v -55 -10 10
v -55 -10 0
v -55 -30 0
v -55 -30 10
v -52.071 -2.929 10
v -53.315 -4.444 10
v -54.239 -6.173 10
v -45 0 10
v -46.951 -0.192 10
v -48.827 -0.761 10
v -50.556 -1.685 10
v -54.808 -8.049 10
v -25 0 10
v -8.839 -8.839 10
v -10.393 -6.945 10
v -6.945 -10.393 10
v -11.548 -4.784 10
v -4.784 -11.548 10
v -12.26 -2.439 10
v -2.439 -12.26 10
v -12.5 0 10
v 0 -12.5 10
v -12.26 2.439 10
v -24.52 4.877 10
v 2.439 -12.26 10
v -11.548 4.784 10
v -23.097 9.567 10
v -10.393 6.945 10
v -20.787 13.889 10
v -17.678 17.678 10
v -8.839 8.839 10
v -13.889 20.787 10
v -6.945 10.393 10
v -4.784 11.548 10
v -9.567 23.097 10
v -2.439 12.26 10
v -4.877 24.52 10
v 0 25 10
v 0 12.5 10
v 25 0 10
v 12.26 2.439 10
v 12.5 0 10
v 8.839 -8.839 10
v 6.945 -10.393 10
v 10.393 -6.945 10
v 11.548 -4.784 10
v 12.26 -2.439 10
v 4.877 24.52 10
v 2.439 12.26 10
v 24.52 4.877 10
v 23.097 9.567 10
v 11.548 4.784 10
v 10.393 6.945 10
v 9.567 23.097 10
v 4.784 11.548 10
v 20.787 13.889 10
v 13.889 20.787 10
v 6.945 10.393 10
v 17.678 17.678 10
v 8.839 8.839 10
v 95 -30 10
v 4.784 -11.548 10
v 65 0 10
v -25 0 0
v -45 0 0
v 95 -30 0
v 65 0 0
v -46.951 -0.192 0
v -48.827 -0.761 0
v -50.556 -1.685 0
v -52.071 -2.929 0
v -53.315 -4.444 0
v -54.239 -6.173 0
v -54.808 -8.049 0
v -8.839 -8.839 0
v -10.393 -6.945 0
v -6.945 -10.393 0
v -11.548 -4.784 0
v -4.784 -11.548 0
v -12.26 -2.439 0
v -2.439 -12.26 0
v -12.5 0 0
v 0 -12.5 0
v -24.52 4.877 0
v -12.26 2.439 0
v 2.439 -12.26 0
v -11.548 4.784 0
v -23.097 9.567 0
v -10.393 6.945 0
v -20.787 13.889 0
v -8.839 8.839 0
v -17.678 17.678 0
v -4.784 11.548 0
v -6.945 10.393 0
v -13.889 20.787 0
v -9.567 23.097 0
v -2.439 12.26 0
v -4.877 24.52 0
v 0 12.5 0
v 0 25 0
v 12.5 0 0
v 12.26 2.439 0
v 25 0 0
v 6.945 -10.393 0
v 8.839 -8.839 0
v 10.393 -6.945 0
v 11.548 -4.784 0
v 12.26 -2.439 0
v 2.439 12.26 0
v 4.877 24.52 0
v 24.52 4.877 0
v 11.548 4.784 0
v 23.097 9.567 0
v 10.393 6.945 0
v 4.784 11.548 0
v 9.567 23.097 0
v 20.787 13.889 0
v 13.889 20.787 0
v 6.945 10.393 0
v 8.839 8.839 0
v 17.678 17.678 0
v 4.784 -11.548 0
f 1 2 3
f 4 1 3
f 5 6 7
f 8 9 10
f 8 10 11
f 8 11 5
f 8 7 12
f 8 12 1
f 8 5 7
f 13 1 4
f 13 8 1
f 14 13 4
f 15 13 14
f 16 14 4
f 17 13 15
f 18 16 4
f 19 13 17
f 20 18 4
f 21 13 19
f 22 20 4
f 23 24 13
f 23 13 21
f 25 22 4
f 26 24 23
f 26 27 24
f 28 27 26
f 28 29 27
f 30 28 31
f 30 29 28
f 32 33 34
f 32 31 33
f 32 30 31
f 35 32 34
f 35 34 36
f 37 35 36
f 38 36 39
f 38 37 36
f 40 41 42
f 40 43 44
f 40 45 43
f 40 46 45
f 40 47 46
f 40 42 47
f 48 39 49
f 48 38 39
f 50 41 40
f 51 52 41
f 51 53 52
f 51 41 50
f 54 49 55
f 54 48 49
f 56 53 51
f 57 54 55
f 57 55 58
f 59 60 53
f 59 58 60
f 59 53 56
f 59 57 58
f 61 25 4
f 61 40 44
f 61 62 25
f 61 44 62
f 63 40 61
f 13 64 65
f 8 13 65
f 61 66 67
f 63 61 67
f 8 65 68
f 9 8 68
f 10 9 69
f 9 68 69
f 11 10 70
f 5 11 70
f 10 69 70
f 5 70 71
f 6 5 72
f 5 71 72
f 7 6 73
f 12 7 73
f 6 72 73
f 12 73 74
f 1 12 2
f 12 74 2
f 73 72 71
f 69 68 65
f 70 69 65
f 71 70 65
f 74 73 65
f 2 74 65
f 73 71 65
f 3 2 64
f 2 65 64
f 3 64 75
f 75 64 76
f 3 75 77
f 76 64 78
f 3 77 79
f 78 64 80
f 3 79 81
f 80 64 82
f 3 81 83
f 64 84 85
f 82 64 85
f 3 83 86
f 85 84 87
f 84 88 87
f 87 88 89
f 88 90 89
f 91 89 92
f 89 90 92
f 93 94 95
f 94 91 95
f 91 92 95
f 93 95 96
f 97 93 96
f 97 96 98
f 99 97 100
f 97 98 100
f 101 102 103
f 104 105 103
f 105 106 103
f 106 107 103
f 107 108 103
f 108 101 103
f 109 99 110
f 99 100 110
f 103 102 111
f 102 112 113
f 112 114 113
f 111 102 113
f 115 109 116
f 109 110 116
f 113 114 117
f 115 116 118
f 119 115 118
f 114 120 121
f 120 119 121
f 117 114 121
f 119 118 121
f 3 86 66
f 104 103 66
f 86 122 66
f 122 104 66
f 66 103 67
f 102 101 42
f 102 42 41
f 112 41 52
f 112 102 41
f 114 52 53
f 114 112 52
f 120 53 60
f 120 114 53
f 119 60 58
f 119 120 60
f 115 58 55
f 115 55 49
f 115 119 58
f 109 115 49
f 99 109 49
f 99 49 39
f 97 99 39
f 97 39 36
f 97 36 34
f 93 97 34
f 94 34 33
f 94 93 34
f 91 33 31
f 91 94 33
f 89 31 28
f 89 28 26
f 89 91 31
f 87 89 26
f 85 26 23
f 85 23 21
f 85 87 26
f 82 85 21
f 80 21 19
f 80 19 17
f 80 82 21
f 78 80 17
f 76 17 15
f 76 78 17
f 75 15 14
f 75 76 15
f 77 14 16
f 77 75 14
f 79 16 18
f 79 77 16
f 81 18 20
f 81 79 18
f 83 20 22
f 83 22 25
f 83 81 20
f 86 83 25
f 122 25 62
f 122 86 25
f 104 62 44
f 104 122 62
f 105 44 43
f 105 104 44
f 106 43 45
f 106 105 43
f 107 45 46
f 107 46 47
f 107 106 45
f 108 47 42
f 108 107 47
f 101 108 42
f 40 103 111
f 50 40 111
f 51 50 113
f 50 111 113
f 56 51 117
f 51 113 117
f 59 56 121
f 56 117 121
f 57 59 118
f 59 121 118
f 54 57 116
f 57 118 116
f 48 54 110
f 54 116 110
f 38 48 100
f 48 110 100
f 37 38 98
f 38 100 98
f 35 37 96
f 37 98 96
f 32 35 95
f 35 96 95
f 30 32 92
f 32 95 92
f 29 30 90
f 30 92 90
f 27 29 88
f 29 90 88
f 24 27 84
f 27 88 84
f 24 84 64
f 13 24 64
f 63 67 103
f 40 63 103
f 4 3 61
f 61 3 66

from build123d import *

# Parameters (mm, degrees)
SKETCH1_R           = 12.5
BOSS_EXTRUDE1_DEPTH = 10


with BuildPart() as part:
    # Sketch1 → Boss-Extrude1 (new body)
    with BuildSketch(Plane.XY):
        with BuildLine():
            Line((-25, 0), (-45, 0))
            ThreePointArc((-45, 0), (-52.071067812, -2.928932188), (-55, -10))
            Line((-55, -10), (-55, -30))
            Line((-55, -30), (95, -30))
            Line((95, -30), (65, 0))
            Line((65, 0), (25, 0))
            ThreePointArc((25, 0), (0, 25), (-25, 0))
        make_face()
        Circle(SKETCH1_R, mode=Mode.SUBTRACT)
    extrude(amount=BOSS_EXTRUDE1_DEPTH)


solid = part.part
